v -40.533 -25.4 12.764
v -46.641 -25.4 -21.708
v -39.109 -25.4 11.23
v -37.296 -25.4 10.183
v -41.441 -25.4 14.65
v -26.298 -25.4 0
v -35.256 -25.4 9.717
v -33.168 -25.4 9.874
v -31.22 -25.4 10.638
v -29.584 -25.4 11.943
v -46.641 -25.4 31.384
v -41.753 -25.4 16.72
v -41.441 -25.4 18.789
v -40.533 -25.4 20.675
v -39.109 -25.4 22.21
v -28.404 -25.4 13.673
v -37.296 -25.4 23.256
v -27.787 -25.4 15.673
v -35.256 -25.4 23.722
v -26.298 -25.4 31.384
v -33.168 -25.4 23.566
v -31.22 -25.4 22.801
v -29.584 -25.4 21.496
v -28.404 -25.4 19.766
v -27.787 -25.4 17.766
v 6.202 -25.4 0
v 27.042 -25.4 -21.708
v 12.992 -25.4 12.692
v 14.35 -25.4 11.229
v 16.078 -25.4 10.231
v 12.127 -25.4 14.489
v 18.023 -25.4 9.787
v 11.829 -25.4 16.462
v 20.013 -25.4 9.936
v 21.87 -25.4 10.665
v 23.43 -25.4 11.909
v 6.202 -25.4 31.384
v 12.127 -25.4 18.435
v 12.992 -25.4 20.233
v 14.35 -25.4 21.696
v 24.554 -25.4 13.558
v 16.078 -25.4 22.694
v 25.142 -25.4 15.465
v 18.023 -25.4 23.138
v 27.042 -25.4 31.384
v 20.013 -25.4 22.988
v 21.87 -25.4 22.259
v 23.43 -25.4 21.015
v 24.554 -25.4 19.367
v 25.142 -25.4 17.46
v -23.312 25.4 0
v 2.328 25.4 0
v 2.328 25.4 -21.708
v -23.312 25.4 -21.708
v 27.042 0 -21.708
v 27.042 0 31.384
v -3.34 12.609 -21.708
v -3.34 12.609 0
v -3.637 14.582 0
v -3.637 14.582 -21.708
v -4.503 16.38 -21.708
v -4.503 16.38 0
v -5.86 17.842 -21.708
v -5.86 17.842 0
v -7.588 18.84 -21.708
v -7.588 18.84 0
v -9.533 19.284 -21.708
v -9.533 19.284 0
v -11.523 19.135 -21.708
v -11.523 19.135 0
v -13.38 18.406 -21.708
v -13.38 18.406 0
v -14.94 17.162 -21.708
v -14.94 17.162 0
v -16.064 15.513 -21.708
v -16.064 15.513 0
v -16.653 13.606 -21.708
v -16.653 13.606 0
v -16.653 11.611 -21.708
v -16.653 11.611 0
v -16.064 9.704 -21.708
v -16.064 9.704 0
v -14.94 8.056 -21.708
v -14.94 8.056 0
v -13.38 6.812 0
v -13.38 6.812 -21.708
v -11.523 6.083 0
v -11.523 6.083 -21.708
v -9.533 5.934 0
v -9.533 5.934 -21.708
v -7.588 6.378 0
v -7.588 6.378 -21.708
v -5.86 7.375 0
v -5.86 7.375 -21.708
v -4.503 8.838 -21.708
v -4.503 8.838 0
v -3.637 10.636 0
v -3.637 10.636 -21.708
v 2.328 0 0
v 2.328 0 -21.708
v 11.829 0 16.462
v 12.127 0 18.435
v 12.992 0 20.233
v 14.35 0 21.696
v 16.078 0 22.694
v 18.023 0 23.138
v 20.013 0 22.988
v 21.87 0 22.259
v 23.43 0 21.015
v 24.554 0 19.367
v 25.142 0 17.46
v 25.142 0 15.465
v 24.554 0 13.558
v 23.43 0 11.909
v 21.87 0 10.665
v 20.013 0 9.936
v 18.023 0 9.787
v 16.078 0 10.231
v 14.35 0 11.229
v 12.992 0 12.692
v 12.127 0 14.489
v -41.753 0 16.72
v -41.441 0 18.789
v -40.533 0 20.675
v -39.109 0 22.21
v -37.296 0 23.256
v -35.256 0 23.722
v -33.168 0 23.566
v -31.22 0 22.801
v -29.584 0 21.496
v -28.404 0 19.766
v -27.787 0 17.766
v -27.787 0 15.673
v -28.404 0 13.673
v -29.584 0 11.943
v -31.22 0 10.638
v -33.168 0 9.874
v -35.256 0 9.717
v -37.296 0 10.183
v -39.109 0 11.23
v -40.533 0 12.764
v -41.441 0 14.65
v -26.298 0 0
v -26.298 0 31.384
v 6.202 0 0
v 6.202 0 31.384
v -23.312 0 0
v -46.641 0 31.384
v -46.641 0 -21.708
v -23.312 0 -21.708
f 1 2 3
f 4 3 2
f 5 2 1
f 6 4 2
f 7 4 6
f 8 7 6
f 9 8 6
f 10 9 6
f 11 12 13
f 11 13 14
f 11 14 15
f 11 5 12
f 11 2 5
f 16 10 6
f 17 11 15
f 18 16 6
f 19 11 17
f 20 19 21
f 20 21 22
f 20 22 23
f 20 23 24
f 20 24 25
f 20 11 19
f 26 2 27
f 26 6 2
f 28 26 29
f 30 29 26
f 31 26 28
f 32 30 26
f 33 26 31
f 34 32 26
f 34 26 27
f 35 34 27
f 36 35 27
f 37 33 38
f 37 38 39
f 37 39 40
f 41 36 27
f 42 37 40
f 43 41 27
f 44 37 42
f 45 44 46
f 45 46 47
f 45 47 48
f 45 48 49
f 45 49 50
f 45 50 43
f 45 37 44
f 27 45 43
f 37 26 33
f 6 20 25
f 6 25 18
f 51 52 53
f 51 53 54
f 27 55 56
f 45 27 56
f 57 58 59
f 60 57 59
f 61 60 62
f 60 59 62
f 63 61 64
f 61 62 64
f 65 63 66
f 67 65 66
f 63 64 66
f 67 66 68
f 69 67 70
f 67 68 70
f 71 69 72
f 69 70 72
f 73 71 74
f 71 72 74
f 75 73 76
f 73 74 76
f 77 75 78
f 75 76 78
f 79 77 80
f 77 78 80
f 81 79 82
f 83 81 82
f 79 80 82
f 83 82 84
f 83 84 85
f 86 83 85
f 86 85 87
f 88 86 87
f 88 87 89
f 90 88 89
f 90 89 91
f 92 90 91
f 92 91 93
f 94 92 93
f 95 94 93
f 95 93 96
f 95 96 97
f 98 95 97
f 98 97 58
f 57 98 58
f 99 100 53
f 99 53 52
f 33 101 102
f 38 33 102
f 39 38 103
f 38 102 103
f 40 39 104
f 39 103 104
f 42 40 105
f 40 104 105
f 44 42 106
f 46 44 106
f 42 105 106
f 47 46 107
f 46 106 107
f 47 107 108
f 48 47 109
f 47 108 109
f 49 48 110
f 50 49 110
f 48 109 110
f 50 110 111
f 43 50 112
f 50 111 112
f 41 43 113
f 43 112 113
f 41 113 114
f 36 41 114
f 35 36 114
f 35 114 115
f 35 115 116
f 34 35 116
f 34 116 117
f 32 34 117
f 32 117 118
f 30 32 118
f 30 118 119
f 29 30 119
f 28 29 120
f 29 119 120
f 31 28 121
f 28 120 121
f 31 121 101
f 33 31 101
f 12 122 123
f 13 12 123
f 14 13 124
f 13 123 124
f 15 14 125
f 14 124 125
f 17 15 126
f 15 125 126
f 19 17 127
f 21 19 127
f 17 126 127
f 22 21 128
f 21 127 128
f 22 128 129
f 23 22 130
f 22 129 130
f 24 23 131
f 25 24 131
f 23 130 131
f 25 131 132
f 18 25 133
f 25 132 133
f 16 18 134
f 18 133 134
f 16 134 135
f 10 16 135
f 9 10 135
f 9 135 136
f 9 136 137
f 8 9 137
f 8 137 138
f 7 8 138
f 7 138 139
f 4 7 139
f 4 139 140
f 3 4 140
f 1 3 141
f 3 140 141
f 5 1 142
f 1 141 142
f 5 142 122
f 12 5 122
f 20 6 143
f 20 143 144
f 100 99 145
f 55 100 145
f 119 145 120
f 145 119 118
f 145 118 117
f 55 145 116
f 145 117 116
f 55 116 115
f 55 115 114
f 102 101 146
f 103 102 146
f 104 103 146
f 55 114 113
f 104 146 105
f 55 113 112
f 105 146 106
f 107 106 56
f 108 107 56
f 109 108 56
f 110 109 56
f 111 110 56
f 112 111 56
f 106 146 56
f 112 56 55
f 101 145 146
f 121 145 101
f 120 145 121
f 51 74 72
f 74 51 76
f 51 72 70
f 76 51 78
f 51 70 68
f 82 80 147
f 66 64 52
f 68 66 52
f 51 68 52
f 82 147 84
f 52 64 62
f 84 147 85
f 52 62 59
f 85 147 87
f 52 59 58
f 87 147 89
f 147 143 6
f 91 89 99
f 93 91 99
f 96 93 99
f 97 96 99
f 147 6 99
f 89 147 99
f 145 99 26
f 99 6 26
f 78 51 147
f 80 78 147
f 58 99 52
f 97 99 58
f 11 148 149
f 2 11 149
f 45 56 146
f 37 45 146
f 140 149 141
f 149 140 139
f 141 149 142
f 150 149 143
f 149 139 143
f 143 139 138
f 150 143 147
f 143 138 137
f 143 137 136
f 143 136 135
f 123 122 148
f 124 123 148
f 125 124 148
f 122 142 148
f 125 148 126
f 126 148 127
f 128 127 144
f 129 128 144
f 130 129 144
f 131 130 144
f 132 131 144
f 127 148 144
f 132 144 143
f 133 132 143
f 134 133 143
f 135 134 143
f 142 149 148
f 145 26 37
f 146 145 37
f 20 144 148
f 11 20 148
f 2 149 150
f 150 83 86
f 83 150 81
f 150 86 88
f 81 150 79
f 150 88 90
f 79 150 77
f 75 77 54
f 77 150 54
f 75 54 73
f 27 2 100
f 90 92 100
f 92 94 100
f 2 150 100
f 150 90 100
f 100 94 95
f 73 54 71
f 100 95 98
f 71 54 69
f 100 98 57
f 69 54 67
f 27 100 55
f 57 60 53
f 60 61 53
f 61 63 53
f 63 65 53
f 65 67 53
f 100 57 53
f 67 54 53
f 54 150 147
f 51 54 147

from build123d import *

# Parameters (mm, degrees)
F1_DEPTH  = 25.4
F2_W      = 32.500189
F2_H      = 31.383768
F3_DEPTH  = 76.2
F4_W      = 25.639828
F4_H      = 21.70814
F5_DEPTH  = 25.4
F8_R      = 6.693883
F9_DEPTH  = 25.4
F6_R      = 6.693885
F10_DEPTH = 25.4
F7_R      = 7.02202
F11_DEPTH = 25.4


with BuildPart() as f1:
    # F0 (on Front) → F1 (new body)
    with BuildSketch(Plane.XZ):
        Polygon((-46.641488, 31.383768), (-46.641488, 28.902836), (-46.641488, -21.70814), (27.042137, -21.70814), (27.042137, 31.383768), align=None)
    extrude(amount=F1_DEPTH)

    # F2 (on face) → F3 (cut)
    with BuildSketch(Plane.XZ.offset(25.4)):
        with Locations((-10.047767, 15.691884)):
            Rectangle(F2_W, F2_H)
    extrude(amount=-F3_DEPTH, mode=Mode.SUBTRACT)

    # F4 (on face) → F5 (join)
    with BuildSketch(Plane(origin=(0, 0, 0), x_dir=(-1, 0, 0), z_dir=(0, 1, 0))):
        with Locations((10.49182, -10.85407)):
            Rectangle(F4_W, F4_H)
    extrude(amount=F5_DEPTH)

    # F8 (on face) → F9 (cut)
    with BuildSketch(Plane.XY):
        with Locations((-10.033408, 12.608757)):
            Circle(F8_R)
    extrude(amount=-F9_DEPTH, mode=Mode.SUBTRACT)

    # F6 (on face) → F10 (cut)
    with BuildSketch(Plane(origin=(0, 0, 0), x_dir=(-1, 0, 0), z_dir=(0, 1, 0))):
        with Locations((-18.523216, 16.462401)):
            Circle(F6_R)
    extrude(amount=-F10_DEPTH, mode=Mode.SUBTRACT)

    # F7 (on face) → F11 (cut)
    with BuildSketch(Plane(origin=(0, 0, 0), x_dir=(-1, 0, 0), z_dir=(0, 1, 0))):
        with Locations((34.731027, 16.719667)):
            Circle(F7_R)
    extrude(amount=-F11_DEPTH, mode=Mode.SUBTRACT)


solid = f1.part
